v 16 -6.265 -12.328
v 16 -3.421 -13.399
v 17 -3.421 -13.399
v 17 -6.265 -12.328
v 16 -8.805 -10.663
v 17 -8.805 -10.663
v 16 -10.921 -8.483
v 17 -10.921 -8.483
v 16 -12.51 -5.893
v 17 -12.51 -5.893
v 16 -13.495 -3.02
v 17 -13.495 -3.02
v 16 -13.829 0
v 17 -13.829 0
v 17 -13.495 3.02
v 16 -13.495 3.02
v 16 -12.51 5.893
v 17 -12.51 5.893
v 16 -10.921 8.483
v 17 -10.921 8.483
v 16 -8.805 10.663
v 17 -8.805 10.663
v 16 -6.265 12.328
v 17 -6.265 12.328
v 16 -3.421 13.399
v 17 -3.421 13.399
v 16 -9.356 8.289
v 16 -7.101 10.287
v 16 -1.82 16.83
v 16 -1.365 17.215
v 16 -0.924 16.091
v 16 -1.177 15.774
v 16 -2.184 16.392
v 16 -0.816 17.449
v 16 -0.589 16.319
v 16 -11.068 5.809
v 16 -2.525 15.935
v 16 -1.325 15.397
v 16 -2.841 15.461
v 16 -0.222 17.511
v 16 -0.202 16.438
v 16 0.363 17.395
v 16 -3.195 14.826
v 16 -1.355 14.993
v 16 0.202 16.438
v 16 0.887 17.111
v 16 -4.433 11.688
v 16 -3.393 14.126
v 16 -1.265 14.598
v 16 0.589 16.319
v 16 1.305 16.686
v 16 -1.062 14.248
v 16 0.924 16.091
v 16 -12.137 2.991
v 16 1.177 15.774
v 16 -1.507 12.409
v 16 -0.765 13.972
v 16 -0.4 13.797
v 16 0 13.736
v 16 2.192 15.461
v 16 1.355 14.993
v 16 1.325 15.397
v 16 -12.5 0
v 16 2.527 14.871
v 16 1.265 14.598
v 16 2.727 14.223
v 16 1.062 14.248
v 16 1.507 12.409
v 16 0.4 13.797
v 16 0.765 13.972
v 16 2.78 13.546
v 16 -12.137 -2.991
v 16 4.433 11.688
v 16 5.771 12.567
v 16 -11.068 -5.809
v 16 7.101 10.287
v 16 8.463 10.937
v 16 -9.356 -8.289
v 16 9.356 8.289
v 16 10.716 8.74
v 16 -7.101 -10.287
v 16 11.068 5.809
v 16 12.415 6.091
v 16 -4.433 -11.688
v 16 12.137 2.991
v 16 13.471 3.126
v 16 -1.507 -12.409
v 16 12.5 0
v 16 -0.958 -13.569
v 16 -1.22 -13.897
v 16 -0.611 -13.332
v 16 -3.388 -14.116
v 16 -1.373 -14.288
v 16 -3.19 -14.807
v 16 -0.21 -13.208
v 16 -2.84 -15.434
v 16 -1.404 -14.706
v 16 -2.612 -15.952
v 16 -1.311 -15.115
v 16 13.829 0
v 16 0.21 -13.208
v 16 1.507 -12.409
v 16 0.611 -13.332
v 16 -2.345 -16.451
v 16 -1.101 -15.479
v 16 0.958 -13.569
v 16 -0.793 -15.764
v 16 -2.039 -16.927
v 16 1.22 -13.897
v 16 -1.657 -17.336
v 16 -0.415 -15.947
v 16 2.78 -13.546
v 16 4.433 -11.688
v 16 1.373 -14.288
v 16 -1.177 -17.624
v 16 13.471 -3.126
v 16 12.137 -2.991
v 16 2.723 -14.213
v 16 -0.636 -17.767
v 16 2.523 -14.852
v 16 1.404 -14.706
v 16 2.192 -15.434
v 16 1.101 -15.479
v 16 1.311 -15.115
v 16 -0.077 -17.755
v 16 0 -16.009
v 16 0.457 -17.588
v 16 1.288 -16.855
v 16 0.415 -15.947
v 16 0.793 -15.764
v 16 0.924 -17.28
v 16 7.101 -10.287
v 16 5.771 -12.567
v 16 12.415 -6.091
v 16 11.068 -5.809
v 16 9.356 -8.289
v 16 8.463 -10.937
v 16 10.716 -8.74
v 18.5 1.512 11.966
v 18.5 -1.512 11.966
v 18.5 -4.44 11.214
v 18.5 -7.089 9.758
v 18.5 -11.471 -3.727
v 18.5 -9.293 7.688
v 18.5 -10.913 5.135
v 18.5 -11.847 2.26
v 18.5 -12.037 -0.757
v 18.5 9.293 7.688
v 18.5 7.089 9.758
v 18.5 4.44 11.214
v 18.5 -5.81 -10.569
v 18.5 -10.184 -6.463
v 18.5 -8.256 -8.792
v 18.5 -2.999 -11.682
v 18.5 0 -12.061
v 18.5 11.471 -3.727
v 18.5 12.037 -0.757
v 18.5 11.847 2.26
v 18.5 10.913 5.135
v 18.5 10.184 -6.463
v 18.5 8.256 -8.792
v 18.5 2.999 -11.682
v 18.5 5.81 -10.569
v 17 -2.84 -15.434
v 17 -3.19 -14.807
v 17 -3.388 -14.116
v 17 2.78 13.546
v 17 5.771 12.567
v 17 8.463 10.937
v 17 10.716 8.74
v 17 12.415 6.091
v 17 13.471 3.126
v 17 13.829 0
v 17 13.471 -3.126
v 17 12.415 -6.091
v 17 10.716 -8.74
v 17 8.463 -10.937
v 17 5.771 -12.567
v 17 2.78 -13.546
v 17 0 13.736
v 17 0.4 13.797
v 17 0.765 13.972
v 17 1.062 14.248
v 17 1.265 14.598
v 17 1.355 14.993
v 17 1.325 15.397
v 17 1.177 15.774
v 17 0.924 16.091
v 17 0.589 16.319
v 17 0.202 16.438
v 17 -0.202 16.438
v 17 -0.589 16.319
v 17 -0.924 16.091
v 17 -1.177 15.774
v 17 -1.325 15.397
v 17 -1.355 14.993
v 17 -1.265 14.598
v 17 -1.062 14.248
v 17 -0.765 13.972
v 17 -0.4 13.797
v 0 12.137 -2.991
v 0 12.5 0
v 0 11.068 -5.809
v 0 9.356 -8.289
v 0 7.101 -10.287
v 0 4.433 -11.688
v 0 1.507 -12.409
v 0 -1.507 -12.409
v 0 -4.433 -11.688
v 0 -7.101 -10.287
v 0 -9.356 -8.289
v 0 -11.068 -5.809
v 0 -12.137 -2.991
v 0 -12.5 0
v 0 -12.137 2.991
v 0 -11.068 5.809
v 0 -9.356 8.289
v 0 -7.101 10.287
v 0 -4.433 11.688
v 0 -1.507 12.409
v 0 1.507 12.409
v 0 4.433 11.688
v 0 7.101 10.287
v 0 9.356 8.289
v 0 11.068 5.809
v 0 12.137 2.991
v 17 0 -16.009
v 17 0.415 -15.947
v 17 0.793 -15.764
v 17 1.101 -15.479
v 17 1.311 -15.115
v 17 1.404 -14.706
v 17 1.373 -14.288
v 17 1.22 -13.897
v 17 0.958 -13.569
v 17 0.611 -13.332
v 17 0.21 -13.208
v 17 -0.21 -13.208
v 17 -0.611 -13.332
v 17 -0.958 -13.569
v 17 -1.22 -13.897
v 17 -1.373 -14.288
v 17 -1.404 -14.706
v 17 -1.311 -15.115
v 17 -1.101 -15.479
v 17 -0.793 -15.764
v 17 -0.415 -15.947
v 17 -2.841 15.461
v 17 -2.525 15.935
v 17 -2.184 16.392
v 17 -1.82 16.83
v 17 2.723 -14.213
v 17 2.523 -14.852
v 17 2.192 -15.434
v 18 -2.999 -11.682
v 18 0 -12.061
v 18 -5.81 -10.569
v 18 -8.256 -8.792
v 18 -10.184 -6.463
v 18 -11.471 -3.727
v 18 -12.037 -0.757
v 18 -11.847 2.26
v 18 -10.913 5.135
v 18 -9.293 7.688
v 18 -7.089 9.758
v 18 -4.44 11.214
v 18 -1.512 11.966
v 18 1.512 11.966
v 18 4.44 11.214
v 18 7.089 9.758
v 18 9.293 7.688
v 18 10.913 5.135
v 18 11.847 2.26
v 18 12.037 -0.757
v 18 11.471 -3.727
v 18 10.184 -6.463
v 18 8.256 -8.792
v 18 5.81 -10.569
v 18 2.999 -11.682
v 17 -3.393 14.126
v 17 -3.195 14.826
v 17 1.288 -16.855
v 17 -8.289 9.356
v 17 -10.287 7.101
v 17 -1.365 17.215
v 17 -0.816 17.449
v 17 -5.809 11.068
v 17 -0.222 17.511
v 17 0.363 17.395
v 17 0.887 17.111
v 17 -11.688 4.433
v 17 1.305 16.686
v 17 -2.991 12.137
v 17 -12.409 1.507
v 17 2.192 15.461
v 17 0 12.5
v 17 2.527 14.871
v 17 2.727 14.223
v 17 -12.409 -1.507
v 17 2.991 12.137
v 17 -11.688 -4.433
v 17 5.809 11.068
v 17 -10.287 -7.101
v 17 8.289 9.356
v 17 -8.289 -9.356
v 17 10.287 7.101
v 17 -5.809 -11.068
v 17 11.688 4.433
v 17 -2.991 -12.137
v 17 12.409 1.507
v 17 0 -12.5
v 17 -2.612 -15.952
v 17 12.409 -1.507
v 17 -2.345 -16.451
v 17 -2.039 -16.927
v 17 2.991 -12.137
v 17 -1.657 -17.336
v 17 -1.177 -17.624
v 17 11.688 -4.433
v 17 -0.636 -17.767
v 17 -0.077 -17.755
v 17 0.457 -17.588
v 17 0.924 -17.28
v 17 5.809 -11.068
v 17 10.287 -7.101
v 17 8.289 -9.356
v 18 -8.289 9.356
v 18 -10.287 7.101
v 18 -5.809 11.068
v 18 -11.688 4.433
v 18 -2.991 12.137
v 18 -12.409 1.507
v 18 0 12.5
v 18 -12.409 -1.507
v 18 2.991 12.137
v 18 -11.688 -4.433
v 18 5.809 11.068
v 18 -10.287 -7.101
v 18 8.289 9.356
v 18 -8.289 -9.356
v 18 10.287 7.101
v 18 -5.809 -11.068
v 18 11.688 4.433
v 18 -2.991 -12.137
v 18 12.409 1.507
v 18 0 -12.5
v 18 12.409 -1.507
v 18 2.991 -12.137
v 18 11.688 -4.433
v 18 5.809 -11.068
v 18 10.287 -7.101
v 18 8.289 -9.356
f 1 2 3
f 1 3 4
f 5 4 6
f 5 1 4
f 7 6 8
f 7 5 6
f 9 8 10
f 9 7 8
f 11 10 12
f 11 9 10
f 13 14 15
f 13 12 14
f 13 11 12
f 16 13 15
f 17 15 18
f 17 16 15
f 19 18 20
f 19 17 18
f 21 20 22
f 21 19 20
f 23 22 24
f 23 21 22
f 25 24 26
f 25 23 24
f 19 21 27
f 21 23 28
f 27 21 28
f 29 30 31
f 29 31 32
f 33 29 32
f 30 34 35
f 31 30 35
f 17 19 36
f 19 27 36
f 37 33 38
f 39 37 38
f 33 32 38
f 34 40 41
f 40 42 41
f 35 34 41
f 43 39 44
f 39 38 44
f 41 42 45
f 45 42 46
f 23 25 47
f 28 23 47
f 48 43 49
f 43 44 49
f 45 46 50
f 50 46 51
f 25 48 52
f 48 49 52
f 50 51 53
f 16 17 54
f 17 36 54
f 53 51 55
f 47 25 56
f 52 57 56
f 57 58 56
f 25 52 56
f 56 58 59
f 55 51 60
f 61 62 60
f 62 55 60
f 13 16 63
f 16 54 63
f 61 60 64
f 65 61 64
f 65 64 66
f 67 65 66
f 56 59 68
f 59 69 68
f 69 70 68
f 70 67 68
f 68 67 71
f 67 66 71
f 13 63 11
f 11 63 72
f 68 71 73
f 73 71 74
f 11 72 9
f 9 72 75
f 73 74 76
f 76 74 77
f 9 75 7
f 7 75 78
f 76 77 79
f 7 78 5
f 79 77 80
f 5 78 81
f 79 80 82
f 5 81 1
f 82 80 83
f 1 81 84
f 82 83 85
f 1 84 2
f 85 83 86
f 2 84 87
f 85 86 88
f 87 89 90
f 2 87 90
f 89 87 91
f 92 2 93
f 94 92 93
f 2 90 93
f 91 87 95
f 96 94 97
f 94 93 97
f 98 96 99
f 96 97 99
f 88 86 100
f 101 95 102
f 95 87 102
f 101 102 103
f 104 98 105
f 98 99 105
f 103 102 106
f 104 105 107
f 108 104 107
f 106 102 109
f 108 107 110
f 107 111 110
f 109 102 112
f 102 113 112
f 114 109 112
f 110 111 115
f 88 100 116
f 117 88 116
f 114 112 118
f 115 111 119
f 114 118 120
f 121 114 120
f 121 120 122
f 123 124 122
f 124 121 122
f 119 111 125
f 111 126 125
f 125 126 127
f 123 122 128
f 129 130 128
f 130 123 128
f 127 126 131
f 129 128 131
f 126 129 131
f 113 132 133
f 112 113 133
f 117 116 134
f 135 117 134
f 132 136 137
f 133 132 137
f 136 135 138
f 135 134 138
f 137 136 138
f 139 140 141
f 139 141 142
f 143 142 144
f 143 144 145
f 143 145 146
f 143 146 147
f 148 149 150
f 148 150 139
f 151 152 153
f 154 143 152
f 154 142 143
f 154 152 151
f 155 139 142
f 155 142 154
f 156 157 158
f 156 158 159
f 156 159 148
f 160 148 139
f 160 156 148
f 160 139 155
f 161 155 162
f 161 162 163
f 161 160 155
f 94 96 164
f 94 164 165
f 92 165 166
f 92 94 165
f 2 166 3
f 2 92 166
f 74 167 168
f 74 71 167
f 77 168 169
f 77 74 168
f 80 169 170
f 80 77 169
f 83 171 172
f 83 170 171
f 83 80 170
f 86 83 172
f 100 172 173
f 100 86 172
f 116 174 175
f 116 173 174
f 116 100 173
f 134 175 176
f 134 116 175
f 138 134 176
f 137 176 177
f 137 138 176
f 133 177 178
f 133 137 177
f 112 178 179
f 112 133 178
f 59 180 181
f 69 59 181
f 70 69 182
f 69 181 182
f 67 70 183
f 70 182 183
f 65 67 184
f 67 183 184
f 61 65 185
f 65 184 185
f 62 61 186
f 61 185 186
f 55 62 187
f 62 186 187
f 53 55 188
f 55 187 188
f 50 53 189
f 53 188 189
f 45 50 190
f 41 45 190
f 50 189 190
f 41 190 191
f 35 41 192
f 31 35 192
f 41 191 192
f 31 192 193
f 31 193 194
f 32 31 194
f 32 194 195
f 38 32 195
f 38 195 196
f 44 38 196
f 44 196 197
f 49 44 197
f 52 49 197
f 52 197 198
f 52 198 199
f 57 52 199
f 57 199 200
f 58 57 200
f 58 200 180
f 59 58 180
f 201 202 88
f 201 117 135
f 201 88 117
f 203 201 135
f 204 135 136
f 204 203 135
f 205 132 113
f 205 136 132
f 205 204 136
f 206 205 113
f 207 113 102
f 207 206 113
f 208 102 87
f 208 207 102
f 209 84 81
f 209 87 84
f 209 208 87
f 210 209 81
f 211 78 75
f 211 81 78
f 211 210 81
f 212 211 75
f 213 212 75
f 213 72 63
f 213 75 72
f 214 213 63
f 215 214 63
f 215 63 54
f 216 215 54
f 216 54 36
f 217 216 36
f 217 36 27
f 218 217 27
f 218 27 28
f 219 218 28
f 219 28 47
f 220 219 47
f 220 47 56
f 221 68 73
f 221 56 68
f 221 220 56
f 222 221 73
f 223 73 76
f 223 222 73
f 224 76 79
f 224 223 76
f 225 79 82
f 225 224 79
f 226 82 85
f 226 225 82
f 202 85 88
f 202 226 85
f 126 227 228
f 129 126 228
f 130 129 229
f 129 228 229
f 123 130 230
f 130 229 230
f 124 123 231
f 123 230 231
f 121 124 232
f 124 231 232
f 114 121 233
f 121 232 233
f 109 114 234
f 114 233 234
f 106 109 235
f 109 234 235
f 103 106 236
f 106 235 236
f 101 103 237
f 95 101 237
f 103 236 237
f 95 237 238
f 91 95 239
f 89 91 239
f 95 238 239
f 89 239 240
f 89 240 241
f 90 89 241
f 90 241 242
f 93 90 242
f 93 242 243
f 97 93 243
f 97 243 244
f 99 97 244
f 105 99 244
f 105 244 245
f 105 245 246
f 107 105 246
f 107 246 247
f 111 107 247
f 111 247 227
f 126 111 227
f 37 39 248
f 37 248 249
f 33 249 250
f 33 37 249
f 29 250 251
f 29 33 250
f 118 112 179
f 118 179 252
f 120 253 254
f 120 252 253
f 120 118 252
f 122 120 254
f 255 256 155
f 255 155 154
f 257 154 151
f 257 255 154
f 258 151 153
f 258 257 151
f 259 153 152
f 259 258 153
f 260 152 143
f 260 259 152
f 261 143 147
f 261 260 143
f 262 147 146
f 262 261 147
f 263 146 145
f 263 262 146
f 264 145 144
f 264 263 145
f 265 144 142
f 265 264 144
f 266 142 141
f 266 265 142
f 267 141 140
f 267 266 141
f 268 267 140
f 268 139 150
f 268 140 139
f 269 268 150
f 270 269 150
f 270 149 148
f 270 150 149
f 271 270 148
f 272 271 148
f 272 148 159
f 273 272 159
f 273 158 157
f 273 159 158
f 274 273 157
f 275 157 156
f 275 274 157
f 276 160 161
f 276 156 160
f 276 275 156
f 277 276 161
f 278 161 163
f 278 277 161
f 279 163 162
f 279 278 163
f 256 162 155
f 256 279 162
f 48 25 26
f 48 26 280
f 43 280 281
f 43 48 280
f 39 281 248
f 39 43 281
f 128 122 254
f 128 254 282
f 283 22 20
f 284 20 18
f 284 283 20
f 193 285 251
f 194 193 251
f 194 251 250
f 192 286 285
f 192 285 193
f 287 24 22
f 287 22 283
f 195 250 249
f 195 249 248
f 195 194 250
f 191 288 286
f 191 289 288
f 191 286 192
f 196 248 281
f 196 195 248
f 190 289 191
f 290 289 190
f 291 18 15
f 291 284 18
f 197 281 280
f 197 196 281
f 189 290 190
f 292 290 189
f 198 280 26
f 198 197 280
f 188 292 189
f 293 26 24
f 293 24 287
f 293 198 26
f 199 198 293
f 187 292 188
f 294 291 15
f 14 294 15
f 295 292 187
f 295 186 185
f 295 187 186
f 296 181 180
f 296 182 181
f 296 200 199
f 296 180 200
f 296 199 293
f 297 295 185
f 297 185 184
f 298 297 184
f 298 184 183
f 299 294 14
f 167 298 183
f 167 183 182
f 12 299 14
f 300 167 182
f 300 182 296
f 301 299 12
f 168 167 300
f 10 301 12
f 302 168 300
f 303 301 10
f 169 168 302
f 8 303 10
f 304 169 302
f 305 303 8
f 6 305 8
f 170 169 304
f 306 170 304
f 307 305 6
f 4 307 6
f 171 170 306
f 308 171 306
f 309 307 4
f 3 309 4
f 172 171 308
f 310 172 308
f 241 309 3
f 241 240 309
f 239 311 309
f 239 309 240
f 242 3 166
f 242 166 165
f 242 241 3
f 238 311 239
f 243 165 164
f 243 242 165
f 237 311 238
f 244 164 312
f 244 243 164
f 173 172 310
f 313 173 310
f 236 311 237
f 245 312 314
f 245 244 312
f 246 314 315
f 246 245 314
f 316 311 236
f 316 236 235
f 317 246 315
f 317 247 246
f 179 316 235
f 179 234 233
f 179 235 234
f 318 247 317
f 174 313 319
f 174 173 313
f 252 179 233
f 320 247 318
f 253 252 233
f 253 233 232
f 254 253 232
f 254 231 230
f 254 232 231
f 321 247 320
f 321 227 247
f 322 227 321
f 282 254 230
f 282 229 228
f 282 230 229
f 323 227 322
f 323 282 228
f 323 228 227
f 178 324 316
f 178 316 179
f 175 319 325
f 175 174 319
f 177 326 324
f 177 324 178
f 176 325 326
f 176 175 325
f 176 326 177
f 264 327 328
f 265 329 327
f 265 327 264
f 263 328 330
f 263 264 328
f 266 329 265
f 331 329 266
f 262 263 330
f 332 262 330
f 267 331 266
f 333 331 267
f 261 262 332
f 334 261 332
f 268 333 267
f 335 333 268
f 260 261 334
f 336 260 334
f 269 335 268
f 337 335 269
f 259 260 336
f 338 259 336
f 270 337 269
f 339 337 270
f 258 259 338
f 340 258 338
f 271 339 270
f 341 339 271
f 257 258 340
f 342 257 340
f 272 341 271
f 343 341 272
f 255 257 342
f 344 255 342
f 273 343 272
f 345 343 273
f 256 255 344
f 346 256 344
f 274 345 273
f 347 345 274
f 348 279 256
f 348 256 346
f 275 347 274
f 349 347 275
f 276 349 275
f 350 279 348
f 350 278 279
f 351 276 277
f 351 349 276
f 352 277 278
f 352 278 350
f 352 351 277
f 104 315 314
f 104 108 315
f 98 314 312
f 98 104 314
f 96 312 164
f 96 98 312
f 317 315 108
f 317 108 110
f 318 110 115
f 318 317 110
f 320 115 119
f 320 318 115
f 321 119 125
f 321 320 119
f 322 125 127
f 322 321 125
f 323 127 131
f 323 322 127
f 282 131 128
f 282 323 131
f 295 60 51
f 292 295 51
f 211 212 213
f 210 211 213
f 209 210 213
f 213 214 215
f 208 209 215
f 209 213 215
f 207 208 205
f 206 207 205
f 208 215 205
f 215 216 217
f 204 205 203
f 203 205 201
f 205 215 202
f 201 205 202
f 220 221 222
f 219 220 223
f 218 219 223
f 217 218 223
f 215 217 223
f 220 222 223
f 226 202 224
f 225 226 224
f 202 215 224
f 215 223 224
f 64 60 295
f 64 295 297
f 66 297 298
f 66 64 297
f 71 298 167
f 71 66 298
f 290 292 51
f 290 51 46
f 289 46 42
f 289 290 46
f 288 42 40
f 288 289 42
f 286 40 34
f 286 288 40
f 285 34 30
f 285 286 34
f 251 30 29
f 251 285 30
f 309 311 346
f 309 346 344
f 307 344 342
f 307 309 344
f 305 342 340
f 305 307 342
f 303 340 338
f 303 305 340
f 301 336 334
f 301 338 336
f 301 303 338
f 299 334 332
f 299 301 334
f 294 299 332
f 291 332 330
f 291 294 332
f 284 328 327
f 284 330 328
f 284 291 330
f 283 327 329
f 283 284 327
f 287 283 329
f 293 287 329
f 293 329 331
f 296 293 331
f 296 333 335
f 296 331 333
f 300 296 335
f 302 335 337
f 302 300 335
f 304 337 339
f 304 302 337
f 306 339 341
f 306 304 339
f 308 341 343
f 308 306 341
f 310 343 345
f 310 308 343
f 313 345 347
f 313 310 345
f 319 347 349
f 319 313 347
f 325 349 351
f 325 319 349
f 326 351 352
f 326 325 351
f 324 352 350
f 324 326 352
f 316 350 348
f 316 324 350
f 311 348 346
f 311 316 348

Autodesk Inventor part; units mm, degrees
ref_plane "YZ Plane" through (0, 0, 0) normal (1, 0, 0) x (0, 1, 0)
ref_plane "XZ Plane" through (0, 0, 0) normal (0, 1, 0) x (-1, 0, 0)
ref_plane "XY Plane" through (0, 0, 0) normal (0, 0, 1) x (1, 0, 0)
sketch "Sketch1" plane through (0, 0, 0) normal (1, 0, 0) x (0, 1, 0)
  circle A0 centre (0, 0) radius 12.5
  dimension "d0" = 25
extrude "Extrusion1" add sketch "Sketch1" along normal blind 16
sketch "Sketch2" plane through (16, 0, 0) normal (1, 0, 0) x (0, 0, -1)
  circle A0 centre (0, 0) radius 13.8287
  arc A1 (-13.5463, 2.7804) -> (-13.3988, -3.4214) centre (-13.6396, -0.3245) ccw
  arc A2 (13.3988, -3.4214) -> (13.5463, 2.7804) centre (13.6137, -0.3239) ccw
  line L0 (-15.4609, 2.1919) -> (-18.4894, 0)
  arc A3 (-18.4894, 0) -> (-15.4609, -2.8409) centre (-9.6242, 6.4162) ccw
  line L1 (15.4336, 2.1919) -> (18.879, 0)
  arc A4 (15.4336, -2.8396) -> (18.879, 0) centre (12.797, 3.8693) ccw
extrude "Extrusion2" add sketch "Sketch2" along normal blind 1
fillet "Fillet1" radius 2 2 edges at (16.5, 0, 18.4894) (16.5, 0, -18.879)
sketch "Sketch3" plane through (17, 0, 0) normal (1, 0, 0) x (0, 0, -1)
  circle A0 centre (0, 0) radius 12.5
extrude "Extrusion3" add sketch "Sketch3" along normal blind 1
sketch "Sketch4" plane through (17, 0, 0) normal (1, 0, 0) x (0, 0, -1)
  circle A0 centre (-15.0948, 0) radius 1.3586
  circle A1 centre (14.6009, 0) radius 1.4082
  point P0 (0, 0)
extrude "Extrusion4" cut sketch "Sketch4" against normal blind 1
sketch "Sketch5" plane through (18, 0, 0) normal (1, 0, 0) x (0, 0, -1)
  point P0 (0, 0)
sketch "Sketch6" plane through (18, 0, 0) normal (1, 0, 0) x (0, 0, -1)
  circle A0 centre (0, 0) radius 12.0611
extrude "Extrusion5" add sketch "Sketch6" along normal blind 0.5
properties part number "PIEZO"
